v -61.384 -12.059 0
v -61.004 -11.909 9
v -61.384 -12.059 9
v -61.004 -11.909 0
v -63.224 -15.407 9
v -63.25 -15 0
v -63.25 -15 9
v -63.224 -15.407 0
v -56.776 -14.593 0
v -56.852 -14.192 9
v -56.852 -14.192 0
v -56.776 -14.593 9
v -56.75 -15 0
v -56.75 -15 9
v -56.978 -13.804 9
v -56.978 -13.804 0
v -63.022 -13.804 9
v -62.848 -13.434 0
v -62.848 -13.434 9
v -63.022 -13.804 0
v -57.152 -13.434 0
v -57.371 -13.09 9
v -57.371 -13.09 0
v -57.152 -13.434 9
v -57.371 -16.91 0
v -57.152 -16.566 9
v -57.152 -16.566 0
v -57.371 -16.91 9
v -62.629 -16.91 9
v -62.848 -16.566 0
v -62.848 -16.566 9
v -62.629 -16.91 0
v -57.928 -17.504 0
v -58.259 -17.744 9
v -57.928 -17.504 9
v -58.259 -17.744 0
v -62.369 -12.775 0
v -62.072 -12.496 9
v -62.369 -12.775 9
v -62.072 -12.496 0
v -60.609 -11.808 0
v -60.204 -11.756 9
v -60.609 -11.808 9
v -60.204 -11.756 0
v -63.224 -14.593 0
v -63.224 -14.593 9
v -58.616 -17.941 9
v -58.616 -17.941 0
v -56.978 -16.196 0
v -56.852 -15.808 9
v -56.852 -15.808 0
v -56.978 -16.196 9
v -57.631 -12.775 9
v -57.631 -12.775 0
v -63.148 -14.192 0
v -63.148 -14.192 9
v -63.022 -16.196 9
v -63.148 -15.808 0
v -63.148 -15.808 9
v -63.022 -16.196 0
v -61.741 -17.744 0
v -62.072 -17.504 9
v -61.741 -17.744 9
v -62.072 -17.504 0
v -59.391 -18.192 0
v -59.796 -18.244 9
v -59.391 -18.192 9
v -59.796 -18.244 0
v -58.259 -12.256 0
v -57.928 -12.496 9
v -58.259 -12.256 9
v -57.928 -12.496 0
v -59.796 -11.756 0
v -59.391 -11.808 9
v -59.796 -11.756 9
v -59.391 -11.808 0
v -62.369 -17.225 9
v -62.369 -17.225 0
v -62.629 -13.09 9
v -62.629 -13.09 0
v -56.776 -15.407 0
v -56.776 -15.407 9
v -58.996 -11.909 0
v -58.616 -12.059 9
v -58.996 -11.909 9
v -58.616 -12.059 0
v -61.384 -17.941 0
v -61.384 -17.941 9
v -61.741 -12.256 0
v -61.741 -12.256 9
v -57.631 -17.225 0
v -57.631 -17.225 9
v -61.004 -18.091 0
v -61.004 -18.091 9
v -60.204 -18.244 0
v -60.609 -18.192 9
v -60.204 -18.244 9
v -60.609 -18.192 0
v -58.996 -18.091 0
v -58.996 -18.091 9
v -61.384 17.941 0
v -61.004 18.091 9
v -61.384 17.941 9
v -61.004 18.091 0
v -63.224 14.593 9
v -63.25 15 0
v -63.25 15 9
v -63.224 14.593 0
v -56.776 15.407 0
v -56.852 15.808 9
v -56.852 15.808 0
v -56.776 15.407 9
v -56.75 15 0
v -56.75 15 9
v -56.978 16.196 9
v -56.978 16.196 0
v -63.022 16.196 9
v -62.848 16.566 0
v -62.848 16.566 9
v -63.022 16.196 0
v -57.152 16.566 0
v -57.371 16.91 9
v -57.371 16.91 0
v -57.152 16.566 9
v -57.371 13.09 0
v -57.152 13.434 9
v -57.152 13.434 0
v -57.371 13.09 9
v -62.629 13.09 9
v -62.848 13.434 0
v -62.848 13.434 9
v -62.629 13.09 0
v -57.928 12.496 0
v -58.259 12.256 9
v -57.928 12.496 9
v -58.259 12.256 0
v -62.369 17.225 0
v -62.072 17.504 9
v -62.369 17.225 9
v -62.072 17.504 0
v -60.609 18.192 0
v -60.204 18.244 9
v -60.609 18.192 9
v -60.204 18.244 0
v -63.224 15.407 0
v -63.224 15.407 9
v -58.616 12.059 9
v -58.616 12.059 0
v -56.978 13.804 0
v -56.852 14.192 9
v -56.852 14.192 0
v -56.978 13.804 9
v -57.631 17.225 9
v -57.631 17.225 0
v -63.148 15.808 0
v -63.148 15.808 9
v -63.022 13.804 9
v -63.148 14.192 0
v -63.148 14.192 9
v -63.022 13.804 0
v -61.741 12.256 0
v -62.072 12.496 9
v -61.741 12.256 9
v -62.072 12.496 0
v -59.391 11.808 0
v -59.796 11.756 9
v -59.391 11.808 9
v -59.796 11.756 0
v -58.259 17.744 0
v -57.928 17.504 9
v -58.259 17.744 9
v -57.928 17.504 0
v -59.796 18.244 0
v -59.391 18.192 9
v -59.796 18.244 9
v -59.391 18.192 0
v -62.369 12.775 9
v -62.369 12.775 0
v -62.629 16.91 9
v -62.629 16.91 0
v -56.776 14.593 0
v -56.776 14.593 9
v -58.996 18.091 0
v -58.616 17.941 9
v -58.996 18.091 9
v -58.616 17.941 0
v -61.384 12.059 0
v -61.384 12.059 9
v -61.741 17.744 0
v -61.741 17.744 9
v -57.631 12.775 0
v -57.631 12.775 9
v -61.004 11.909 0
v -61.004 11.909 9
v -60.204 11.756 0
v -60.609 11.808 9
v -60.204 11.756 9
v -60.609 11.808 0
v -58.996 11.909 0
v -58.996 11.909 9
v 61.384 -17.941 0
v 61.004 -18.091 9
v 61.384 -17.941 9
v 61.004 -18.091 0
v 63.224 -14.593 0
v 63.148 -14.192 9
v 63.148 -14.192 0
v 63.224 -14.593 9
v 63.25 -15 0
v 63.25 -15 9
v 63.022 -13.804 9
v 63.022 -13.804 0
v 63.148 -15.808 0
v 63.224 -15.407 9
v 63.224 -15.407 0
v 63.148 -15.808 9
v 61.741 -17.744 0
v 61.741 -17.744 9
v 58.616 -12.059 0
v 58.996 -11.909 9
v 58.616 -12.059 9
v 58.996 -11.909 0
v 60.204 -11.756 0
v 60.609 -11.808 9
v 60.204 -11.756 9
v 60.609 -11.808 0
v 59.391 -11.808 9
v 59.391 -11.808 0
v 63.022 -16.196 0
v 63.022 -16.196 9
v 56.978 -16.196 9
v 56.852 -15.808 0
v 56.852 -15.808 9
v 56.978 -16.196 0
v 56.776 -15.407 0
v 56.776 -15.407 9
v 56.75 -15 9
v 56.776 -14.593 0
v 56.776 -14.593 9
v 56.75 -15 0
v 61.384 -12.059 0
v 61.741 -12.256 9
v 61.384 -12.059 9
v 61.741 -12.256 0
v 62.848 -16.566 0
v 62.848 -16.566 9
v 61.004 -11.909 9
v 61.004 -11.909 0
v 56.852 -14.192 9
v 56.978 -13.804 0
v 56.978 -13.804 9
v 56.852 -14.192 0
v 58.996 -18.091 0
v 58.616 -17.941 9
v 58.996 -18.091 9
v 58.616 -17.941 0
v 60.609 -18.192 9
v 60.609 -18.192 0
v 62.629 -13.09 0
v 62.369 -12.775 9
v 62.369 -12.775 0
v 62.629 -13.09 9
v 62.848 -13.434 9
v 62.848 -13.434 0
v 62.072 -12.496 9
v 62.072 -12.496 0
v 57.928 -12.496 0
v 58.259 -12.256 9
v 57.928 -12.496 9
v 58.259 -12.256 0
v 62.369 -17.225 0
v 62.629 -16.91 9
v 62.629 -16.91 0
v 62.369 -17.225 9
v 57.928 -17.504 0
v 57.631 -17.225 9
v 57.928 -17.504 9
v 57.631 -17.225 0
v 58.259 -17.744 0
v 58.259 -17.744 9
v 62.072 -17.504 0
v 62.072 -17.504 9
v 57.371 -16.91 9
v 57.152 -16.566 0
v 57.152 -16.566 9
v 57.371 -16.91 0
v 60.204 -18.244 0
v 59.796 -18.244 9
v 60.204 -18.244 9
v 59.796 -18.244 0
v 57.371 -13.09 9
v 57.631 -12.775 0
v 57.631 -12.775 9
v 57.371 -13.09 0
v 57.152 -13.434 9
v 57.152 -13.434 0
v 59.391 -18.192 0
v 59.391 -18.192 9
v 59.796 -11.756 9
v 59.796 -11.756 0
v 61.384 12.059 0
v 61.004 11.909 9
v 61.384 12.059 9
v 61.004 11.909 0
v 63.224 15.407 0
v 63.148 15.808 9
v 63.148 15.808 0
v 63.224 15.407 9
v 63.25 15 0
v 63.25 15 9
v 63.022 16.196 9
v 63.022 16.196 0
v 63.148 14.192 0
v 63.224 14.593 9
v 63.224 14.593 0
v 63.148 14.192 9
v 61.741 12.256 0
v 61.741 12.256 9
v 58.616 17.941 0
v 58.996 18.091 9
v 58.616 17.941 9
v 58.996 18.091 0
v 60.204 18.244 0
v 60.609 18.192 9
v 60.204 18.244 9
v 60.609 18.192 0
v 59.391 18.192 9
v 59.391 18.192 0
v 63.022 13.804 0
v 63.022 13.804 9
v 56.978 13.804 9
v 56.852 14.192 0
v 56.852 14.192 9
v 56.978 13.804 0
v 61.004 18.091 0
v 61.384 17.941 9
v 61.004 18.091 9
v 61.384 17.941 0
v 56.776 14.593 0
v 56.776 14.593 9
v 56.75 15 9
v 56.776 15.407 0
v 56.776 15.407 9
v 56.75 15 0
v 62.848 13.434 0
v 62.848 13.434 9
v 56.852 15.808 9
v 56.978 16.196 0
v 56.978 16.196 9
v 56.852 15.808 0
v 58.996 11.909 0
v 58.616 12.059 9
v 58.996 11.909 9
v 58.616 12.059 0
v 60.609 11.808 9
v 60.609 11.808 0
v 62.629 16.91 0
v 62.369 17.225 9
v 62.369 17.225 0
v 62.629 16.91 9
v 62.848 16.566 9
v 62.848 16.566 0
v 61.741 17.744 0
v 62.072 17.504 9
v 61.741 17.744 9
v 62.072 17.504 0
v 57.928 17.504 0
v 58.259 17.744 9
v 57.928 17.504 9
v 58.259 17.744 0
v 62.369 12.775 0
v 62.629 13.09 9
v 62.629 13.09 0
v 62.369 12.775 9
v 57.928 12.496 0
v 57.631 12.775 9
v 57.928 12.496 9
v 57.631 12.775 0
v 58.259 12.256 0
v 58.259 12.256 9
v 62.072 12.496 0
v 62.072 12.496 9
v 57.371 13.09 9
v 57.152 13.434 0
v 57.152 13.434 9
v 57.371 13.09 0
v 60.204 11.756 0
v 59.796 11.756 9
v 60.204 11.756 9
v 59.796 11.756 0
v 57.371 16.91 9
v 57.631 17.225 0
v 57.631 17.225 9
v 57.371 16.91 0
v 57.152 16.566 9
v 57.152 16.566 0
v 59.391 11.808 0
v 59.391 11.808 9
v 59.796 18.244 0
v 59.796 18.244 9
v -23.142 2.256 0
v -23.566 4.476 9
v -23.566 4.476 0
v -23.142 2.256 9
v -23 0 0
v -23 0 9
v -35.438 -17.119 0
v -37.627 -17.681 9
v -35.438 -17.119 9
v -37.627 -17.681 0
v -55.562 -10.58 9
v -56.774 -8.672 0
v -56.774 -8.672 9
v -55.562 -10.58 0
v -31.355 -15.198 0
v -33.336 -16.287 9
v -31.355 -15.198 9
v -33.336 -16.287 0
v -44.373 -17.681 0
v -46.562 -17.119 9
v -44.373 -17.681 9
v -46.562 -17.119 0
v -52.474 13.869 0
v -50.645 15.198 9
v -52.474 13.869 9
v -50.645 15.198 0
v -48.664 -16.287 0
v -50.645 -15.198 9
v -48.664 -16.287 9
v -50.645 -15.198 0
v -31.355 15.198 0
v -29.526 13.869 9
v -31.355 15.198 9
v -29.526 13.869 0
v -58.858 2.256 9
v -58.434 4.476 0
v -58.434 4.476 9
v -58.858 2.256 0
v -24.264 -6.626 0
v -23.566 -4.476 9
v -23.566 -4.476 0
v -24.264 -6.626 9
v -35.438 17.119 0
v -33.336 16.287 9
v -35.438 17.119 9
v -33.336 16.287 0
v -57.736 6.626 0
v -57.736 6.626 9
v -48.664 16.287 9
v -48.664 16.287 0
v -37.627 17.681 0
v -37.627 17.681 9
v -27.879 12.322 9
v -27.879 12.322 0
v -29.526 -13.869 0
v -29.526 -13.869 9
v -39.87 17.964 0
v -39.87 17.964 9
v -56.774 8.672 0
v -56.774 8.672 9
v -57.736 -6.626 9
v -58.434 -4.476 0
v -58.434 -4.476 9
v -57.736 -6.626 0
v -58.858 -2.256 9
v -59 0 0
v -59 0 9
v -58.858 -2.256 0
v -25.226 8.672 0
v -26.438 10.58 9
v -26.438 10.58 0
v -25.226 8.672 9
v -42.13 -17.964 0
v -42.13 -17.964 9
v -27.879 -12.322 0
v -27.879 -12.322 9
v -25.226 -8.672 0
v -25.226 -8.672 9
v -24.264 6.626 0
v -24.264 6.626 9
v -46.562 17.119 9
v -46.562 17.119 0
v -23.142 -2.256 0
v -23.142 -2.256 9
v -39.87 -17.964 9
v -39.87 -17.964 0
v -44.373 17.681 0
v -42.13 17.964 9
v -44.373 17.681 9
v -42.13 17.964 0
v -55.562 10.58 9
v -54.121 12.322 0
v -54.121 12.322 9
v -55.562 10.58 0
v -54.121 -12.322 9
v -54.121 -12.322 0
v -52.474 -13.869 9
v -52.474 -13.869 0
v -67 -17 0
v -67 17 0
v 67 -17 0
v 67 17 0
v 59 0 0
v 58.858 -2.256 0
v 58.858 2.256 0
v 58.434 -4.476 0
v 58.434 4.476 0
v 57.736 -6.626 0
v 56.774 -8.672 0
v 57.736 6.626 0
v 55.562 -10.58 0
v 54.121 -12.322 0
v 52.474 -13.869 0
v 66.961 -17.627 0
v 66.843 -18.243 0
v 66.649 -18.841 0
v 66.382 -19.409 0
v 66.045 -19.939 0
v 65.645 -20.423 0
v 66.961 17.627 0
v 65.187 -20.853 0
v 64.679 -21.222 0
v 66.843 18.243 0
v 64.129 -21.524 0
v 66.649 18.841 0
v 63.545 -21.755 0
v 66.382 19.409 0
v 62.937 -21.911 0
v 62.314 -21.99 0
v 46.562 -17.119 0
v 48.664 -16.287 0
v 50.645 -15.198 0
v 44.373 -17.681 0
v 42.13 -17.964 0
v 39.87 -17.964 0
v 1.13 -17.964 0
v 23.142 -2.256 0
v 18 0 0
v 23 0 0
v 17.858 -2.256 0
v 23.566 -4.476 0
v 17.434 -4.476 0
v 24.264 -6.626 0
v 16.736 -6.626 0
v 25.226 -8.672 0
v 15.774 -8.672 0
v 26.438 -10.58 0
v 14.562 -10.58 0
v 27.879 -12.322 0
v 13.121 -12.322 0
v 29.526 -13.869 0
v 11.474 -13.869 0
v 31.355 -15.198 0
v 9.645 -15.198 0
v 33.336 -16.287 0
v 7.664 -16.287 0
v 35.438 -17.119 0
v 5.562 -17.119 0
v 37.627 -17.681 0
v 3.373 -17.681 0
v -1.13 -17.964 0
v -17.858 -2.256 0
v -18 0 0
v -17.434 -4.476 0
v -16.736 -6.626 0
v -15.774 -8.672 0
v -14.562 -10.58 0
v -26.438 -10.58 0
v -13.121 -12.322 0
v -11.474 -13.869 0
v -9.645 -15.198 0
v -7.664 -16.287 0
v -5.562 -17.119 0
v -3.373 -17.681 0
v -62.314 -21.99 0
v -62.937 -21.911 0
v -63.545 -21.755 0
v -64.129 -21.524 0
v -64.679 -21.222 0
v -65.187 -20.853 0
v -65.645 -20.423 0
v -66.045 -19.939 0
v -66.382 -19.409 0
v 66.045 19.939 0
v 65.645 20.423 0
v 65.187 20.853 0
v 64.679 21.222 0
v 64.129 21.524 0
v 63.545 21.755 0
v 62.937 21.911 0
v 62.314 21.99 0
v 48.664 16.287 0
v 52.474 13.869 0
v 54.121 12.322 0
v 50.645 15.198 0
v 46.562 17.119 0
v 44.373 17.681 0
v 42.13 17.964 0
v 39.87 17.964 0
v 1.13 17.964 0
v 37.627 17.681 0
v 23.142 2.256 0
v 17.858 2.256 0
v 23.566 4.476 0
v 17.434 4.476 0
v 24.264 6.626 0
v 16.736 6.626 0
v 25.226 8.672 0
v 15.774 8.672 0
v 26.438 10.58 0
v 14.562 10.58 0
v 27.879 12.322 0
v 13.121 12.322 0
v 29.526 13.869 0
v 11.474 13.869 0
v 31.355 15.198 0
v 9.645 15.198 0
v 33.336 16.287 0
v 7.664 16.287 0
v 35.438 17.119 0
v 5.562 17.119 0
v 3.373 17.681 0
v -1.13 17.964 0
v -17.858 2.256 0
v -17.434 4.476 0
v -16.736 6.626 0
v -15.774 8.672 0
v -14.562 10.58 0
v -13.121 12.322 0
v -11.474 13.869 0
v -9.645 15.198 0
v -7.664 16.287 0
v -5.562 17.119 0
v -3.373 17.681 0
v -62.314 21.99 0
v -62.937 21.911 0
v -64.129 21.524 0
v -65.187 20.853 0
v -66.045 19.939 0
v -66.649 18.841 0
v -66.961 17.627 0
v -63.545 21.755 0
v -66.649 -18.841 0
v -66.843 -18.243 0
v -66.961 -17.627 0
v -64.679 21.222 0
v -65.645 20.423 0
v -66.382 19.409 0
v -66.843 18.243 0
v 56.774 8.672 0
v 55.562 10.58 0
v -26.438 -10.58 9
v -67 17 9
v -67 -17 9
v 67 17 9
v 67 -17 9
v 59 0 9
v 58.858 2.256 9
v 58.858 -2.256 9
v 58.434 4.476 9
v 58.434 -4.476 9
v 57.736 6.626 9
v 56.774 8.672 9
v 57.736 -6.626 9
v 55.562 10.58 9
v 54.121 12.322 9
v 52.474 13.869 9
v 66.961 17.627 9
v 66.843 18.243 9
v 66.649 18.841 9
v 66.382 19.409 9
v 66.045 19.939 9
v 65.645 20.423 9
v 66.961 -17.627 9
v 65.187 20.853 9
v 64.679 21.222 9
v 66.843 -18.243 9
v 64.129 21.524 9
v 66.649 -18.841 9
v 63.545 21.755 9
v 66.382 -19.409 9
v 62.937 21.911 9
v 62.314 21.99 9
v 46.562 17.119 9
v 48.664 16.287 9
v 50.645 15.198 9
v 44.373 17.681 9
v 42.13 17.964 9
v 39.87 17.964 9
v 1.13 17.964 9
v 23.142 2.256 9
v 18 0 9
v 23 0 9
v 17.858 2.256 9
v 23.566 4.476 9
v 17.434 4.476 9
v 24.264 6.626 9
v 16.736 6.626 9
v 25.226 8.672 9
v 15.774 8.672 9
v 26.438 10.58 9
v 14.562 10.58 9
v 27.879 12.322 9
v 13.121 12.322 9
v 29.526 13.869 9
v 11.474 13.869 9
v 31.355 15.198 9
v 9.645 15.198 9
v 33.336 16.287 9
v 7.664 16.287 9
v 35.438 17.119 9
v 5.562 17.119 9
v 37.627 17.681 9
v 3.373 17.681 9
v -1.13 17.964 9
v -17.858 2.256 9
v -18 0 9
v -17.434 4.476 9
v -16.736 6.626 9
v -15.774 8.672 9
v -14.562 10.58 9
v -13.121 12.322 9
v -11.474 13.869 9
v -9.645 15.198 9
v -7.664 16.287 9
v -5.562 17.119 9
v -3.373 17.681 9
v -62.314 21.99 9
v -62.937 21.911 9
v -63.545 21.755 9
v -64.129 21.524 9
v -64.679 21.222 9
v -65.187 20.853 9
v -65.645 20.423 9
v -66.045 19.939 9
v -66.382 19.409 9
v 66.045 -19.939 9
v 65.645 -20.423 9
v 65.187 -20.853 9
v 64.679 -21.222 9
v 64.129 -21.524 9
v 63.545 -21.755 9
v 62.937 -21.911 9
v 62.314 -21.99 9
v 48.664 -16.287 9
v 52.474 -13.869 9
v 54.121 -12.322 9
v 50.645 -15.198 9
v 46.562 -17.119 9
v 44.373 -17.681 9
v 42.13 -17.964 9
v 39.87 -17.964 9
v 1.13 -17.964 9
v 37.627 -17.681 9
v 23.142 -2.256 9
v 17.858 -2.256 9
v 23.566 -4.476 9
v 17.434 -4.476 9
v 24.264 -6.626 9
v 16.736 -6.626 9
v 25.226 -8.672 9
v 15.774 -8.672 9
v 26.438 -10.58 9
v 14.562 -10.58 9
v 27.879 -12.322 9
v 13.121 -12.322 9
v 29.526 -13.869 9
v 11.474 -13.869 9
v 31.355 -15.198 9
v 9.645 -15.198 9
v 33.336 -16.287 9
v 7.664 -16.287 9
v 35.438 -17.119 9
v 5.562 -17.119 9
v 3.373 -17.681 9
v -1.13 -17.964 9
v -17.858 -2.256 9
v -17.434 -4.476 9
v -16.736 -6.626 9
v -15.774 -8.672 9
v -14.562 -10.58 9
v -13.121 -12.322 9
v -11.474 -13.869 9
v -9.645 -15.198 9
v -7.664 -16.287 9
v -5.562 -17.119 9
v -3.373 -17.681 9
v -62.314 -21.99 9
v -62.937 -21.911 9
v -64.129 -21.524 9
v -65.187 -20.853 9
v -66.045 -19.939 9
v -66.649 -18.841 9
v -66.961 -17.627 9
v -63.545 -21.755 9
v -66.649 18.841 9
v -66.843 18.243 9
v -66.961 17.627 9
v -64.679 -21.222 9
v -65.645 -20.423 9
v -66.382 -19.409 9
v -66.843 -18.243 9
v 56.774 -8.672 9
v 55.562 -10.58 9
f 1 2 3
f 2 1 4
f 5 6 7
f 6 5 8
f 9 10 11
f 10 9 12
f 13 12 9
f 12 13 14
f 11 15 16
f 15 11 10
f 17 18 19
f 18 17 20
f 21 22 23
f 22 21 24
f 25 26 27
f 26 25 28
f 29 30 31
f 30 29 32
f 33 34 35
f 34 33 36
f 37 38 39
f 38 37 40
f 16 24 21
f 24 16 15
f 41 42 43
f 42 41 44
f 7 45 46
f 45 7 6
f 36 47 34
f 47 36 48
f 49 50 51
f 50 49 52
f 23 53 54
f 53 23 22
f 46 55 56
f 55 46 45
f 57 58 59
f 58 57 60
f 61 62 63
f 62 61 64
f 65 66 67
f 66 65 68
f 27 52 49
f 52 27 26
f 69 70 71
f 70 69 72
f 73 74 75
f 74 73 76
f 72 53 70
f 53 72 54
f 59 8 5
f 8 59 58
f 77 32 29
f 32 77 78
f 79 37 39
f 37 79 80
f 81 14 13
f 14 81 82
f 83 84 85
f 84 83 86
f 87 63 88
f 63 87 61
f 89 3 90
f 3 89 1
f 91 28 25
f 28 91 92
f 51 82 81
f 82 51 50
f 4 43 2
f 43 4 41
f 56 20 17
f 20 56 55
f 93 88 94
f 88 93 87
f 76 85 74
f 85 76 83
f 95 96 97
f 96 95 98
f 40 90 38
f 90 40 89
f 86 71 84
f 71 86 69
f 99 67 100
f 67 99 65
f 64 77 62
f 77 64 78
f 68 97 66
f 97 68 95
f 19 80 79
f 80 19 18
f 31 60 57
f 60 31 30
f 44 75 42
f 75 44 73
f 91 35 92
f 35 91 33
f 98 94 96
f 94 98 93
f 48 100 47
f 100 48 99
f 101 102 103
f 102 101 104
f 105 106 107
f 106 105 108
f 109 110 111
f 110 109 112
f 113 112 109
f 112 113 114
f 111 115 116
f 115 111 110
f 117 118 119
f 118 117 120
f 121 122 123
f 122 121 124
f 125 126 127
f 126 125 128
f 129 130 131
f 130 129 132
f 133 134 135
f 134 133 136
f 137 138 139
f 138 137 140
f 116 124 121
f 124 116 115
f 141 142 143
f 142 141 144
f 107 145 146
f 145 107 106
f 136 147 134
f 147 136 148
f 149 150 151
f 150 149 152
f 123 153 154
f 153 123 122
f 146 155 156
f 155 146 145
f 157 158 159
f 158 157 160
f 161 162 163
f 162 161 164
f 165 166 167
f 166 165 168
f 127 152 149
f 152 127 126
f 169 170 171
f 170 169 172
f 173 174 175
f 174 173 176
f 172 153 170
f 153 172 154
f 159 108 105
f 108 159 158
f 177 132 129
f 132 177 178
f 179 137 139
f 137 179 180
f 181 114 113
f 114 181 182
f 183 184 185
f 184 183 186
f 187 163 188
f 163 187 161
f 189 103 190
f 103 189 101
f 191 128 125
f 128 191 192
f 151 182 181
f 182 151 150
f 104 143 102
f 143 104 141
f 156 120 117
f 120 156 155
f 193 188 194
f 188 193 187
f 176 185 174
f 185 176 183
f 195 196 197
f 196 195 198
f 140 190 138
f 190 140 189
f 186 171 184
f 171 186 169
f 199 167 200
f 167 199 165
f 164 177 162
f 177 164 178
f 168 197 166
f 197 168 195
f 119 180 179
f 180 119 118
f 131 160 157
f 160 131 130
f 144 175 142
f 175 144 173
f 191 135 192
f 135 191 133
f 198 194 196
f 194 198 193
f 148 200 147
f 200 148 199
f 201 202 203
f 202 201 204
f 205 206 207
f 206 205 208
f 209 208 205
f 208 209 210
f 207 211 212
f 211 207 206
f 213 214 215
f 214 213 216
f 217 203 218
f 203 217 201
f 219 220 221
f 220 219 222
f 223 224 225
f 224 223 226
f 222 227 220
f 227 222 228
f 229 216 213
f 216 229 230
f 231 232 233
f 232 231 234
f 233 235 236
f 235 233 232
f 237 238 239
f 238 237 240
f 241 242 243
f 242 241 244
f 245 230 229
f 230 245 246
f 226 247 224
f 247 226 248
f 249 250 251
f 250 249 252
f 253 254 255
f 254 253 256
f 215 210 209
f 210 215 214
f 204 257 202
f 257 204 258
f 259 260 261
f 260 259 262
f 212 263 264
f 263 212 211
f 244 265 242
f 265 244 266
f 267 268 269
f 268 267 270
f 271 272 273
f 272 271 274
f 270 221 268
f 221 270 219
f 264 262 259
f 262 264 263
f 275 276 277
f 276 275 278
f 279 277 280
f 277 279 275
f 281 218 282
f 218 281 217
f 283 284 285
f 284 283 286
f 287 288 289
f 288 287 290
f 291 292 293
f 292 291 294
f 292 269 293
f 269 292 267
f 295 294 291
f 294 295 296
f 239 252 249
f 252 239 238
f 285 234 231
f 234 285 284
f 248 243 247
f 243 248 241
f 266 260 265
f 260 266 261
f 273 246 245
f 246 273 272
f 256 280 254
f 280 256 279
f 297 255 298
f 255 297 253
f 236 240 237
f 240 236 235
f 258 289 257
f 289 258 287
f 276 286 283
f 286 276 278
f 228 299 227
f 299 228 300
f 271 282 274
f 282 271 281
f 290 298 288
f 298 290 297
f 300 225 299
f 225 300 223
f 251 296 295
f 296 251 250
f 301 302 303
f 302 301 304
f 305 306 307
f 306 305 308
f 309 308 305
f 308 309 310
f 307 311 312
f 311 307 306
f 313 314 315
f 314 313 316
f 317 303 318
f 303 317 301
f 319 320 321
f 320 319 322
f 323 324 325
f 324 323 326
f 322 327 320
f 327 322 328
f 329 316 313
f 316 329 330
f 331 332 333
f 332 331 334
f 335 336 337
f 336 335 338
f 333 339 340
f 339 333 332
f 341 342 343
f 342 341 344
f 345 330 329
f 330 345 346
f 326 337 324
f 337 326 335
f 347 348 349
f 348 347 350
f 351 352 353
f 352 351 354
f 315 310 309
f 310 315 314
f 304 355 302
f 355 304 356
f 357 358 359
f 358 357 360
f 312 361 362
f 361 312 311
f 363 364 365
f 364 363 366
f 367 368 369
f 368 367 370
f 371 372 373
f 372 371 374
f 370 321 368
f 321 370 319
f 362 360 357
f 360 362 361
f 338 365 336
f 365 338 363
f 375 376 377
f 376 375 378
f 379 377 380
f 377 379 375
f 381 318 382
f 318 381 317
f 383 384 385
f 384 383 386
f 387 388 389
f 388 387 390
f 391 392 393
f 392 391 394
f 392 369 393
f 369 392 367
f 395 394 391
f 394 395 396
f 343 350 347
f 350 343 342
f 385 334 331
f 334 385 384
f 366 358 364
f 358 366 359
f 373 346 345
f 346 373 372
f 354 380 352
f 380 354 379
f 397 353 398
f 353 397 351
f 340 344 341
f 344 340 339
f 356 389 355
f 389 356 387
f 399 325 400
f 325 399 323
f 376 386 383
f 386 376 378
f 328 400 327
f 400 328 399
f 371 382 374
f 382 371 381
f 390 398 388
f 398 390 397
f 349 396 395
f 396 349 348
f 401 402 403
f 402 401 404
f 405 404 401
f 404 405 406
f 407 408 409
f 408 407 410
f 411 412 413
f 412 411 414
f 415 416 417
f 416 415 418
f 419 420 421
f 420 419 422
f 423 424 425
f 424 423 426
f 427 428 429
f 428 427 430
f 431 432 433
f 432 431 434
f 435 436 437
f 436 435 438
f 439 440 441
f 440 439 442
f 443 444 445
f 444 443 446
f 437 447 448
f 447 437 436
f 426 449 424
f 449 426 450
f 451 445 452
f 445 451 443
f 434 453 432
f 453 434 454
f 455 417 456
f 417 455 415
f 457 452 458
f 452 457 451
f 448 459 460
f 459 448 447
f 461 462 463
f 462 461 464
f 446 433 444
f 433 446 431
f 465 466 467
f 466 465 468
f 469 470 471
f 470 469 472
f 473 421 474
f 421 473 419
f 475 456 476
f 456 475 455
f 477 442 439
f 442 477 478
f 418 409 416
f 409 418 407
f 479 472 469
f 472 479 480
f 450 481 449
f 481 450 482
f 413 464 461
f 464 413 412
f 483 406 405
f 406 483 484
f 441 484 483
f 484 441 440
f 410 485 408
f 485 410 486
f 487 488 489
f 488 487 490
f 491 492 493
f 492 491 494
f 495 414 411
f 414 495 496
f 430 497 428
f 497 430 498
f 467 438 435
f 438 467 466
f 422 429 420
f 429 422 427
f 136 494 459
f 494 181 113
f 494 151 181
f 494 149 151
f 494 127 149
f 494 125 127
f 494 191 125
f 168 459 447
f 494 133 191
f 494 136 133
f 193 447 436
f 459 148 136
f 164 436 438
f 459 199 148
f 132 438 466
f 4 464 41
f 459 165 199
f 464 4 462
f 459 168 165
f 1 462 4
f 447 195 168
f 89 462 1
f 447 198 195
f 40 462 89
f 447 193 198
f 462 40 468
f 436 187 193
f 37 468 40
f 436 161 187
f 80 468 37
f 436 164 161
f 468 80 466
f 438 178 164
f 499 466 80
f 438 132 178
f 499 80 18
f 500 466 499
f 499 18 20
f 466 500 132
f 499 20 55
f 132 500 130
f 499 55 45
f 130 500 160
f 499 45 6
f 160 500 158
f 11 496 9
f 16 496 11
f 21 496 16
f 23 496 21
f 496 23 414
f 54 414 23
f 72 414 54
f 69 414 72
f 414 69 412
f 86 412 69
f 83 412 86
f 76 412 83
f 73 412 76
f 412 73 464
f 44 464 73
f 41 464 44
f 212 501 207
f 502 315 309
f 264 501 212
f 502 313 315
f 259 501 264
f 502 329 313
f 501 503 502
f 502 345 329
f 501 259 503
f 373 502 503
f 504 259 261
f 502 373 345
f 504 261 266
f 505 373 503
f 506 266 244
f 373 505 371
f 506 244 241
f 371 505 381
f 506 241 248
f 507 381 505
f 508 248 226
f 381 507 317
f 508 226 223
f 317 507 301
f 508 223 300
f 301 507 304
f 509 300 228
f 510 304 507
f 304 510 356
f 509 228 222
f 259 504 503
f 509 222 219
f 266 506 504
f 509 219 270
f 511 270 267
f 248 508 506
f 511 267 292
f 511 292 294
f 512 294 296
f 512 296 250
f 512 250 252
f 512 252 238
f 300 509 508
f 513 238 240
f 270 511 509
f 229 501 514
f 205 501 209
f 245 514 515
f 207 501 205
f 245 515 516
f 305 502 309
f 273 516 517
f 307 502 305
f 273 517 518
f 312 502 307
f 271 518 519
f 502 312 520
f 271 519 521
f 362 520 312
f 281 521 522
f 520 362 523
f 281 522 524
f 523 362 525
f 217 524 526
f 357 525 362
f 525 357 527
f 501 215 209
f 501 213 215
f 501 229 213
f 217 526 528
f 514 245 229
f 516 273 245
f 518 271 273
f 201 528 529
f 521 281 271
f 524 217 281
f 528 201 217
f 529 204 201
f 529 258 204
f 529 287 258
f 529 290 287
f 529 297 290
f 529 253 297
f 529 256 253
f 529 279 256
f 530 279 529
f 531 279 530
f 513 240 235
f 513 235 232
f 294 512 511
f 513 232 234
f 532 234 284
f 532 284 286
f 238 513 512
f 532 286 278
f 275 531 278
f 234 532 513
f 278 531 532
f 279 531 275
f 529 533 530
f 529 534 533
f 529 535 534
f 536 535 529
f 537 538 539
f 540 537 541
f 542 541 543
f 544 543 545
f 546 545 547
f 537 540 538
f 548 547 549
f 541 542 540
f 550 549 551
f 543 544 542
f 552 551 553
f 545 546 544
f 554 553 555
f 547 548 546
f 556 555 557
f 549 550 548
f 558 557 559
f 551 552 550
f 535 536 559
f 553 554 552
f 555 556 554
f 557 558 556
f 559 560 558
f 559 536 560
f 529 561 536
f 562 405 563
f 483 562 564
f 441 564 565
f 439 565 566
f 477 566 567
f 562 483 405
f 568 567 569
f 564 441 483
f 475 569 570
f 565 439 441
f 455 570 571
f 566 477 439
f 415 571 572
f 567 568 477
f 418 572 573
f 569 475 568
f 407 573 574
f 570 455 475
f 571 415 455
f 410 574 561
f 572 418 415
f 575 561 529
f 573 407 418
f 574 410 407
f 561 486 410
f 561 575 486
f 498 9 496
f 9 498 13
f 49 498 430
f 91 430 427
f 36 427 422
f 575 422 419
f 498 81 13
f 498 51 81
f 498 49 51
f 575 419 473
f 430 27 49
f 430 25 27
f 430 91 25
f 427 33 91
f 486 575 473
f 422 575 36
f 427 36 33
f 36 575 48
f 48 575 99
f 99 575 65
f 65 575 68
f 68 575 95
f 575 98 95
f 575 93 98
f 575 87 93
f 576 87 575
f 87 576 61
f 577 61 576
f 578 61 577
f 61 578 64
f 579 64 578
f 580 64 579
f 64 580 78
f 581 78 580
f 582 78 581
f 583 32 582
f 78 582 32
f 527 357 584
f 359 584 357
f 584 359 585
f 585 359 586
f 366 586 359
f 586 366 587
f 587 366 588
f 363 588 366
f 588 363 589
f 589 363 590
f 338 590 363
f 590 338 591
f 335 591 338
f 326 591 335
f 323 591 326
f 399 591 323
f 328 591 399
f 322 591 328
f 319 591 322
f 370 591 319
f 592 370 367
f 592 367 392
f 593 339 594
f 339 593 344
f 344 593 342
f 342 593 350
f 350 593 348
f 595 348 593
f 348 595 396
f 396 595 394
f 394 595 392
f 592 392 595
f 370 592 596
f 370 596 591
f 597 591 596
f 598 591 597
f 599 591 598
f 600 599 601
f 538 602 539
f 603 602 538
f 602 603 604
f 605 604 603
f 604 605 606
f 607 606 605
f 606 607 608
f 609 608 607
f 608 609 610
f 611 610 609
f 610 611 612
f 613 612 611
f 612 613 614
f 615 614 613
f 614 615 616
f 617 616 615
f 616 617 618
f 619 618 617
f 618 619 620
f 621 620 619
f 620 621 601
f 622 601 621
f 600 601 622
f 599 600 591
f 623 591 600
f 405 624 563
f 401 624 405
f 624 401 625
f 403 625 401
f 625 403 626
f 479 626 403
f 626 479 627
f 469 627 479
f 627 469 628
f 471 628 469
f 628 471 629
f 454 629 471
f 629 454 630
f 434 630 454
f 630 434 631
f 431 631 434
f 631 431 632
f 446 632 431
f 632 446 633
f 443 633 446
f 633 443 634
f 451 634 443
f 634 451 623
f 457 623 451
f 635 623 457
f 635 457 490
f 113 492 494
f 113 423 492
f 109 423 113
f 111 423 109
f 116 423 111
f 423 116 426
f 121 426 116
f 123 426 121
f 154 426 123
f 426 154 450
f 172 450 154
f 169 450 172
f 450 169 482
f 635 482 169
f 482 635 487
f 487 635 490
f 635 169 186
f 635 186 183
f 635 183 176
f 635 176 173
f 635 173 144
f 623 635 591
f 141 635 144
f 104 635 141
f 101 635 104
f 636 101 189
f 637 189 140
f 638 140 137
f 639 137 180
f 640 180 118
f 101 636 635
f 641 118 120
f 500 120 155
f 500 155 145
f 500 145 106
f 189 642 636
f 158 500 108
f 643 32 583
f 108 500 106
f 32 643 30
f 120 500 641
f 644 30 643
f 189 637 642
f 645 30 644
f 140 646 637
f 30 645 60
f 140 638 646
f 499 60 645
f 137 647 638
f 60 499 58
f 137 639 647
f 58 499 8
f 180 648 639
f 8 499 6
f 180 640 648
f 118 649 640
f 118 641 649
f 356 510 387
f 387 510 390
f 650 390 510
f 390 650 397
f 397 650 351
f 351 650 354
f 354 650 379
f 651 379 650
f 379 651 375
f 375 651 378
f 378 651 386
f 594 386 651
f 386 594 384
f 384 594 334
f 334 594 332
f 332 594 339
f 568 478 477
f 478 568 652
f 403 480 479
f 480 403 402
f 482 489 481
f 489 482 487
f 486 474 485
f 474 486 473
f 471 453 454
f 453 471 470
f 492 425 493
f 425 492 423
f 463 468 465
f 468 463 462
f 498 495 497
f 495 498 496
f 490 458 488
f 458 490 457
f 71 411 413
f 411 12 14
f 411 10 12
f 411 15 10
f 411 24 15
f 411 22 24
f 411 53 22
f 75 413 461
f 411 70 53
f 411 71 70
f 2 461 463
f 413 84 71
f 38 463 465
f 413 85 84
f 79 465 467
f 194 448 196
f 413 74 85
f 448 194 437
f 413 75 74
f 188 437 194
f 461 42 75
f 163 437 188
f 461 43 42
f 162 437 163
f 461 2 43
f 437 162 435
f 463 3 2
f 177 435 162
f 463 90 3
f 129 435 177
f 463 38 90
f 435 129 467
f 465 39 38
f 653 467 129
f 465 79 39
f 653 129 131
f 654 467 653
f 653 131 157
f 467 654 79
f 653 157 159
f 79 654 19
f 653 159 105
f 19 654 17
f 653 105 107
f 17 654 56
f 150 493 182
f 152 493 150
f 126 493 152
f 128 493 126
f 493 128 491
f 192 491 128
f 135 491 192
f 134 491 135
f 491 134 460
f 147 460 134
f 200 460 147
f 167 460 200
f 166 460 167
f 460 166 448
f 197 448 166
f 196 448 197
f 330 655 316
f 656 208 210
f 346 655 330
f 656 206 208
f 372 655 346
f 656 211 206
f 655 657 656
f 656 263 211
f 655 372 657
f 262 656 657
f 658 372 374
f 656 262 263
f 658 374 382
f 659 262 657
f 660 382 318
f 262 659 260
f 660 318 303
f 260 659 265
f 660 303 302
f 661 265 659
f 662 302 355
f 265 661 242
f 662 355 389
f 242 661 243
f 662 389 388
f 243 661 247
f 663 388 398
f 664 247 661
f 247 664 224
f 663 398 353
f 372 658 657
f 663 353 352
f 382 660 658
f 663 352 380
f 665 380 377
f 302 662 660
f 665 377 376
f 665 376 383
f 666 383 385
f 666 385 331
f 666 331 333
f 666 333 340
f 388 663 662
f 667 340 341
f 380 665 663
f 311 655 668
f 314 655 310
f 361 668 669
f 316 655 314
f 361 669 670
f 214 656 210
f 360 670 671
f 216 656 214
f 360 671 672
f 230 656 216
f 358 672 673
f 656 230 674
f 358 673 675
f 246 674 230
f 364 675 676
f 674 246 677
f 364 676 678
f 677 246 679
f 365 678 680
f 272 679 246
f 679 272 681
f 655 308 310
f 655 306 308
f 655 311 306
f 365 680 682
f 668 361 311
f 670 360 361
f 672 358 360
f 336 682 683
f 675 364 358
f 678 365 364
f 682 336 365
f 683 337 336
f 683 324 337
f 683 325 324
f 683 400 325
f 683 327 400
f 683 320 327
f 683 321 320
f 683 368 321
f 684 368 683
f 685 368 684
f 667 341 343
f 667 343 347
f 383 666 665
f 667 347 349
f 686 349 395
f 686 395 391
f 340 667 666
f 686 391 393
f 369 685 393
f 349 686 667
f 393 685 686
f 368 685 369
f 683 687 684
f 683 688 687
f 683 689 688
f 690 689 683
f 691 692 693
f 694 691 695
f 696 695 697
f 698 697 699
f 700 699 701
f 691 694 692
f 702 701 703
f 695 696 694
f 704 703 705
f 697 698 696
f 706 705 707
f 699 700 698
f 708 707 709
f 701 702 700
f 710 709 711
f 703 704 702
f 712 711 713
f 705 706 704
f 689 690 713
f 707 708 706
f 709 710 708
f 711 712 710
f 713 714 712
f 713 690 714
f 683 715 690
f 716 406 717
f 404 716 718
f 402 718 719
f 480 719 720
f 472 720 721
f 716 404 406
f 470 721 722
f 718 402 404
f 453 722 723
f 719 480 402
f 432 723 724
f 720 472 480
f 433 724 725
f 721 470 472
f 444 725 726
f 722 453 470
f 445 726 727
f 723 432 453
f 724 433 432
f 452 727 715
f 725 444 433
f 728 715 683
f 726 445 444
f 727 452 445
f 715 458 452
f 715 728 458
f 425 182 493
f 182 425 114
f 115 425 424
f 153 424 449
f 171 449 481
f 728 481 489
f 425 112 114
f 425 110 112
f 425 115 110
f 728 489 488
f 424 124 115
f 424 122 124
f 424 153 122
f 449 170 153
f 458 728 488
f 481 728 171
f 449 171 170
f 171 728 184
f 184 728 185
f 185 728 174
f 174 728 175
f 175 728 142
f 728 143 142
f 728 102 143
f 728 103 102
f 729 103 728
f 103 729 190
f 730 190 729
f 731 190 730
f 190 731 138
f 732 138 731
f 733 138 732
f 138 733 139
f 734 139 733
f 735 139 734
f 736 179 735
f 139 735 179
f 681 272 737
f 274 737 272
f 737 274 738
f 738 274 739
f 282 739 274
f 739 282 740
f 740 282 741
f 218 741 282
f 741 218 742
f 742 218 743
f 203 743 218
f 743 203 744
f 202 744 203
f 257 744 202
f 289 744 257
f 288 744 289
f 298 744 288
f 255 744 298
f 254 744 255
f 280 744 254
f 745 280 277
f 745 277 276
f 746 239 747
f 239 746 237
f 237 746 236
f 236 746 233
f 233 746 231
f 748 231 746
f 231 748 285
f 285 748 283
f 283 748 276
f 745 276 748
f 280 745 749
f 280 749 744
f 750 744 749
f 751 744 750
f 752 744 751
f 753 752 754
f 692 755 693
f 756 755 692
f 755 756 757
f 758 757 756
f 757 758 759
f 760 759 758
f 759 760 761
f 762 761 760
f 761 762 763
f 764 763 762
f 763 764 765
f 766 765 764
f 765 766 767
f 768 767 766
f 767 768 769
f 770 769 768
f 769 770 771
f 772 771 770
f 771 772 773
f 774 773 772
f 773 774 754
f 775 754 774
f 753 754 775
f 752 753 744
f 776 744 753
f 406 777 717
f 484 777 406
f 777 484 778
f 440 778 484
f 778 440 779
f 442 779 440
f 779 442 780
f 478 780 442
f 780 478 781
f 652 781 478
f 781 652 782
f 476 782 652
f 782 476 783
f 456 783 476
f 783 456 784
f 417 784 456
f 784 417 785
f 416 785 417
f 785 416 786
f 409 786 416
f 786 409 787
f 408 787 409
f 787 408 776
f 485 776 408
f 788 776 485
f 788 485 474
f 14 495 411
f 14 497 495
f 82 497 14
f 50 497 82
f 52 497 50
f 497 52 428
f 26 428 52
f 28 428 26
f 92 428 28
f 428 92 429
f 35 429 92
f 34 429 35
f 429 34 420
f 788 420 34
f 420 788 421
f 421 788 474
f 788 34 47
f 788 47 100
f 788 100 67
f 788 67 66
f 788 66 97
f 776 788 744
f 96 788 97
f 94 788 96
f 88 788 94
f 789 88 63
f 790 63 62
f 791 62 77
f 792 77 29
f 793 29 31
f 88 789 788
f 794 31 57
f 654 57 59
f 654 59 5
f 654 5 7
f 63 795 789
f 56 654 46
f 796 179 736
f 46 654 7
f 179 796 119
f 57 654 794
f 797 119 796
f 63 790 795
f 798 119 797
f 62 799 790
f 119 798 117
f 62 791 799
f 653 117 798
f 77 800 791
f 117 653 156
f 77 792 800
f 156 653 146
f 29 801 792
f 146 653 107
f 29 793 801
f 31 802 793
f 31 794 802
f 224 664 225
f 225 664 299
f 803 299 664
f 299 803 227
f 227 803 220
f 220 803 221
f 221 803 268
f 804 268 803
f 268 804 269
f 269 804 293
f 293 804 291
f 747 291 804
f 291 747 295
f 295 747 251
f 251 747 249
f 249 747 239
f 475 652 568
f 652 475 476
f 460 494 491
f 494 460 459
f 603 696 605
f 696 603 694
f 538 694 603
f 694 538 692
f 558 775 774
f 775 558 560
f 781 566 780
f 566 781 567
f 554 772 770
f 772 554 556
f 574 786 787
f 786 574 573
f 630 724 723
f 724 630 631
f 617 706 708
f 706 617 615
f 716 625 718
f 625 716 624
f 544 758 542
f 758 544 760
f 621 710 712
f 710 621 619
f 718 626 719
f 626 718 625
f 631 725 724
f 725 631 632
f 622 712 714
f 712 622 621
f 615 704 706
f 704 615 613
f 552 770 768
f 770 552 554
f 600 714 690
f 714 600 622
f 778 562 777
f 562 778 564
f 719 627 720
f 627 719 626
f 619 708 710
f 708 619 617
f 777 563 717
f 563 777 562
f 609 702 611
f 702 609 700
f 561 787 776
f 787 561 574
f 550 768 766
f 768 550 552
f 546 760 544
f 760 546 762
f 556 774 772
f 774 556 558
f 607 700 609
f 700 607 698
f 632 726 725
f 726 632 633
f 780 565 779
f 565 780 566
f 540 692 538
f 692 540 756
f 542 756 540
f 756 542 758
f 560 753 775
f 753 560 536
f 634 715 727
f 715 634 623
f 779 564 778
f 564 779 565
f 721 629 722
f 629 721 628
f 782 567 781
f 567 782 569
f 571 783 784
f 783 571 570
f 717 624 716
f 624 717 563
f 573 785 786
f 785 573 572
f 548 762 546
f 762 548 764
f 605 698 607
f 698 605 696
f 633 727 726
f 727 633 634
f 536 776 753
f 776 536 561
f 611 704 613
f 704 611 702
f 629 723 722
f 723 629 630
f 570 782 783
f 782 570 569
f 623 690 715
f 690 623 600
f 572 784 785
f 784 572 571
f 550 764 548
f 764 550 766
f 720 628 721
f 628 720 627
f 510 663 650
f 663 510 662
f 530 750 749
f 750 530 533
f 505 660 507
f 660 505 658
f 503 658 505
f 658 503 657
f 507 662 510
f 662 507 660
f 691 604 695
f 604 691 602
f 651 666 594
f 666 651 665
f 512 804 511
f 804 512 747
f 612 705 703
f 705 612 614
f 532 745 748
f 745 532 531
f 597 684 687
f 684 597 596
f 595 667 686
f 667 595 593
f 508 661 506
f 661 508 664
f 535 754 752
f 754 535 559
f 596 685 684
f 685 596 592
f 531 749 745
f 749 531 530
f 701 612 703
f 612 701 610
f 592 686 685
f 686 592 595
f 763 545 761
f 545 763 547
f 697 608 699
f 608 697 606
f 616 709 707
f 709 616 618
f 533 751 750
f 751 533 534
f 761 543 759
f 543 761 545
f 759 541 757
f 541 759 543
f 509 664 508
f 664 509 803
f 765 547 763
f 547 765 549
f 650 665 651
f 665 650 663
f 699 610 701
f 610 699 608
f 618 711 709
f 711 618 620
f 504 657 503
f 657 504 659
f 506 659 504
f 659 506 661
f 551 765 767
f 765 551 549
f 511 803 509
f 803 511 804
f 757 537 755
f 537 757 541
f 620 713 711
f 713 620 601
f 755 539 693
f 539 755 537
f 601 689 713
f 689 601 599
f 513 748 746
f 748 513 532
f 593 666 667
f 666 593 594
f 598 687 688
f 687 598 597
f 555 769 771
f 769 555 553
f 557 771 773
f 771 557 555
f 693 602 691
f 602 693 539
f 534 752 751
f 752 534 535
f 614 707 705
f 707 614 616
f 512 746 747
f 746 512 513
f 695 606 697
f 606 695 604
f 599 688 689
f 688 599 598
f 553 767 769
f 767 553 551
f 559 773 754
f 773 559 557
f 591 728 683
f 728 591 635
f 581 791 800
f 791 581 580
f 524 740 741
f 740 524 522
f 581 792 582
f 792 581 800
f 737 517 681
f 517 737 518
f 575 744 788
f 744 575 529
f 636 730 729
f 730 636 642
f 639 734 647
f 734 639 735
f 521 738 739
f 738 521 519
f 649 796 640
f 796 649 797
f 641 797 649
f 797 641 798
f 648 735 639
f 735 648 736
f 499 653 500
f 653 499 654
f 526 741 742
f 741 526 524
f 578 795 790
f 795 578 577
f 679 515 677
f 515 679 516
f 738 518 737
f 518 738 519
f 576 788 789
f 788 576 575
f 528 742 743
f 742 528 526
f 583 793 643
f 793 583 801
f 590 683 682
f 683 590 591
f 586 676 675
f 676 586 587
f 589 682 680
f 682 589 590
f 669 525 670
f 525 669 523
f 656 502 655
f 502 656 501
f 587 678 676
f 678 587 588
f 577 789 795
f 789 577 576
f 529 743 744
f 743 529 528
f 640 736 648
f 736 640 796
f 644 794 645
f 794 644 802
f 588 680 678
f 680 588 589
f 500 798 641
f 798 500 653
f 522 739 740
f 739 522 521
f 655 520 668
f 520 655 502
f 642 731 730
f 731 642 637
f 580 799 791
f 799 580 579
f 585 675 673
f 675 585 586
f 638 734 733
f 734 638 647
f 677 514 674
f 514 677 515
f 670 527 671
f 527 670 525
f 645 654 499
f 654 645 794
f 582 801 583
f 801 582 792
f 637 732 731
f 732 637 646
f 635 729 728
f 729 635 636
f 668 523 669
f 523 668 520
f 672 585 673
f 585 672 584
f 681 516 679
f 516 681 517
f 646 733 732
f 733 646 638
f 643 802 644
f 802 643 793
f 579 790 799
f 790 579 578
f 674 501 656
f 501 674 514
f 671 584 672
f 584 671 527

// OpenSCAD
$fn = 50;


difference() {
	union() {
		hull() {
			translate(v = [-62.0000000000, 17.0000000000, 0]) {
				cylinder(h = 9, r = 5);
			}
			translate(v = [62.0000000000, 17.0000000000, 0]) {
				cylinder(h = 9, r = 5);
			}
			translate(v = [-62.0000000000, -17.0000000000, 0]) {
				cylinder(h = 9, r = 5);
			}
			translate(v = [62.0000000000, -17.0000000000, 0]) {
				cylinder(h = 9, r = 5);
			}
		}
	}
	union() {
		#translate(v = [-60.0000000000, -15.0000000000, -100.0000000000]) {
			cylinder(h = 200, r = 3.2500000000);
		}
		#translate(v = [-60.0000000000, 15.0000000000, -100.0000000000]) {
			cylinder(h = 200, r = 3.2500000000);
		}
		#translate(v = [60.0000000000, -15.0000000000, -100.0000000000]) {
			cylinder(h = 200, r = 3.2500000000);
		}
		#translate(v = [60.0000000000, 15.0000000000, -100.0000000000]) {
			cylinder(h = 200, r = 3.2500000000);
		}
		#translate(v = [-41.0000000000, 0, 0]) {
			cylinder(h = 9, r = 18.0000000000);
		}
		#cylinder(h = 9, r = 18.0000000000);
		#translate(v = [41.0000000000, 0, 0]) {
			cylinder(h = 9, r = 18.0000000000);
		}
	}
}
